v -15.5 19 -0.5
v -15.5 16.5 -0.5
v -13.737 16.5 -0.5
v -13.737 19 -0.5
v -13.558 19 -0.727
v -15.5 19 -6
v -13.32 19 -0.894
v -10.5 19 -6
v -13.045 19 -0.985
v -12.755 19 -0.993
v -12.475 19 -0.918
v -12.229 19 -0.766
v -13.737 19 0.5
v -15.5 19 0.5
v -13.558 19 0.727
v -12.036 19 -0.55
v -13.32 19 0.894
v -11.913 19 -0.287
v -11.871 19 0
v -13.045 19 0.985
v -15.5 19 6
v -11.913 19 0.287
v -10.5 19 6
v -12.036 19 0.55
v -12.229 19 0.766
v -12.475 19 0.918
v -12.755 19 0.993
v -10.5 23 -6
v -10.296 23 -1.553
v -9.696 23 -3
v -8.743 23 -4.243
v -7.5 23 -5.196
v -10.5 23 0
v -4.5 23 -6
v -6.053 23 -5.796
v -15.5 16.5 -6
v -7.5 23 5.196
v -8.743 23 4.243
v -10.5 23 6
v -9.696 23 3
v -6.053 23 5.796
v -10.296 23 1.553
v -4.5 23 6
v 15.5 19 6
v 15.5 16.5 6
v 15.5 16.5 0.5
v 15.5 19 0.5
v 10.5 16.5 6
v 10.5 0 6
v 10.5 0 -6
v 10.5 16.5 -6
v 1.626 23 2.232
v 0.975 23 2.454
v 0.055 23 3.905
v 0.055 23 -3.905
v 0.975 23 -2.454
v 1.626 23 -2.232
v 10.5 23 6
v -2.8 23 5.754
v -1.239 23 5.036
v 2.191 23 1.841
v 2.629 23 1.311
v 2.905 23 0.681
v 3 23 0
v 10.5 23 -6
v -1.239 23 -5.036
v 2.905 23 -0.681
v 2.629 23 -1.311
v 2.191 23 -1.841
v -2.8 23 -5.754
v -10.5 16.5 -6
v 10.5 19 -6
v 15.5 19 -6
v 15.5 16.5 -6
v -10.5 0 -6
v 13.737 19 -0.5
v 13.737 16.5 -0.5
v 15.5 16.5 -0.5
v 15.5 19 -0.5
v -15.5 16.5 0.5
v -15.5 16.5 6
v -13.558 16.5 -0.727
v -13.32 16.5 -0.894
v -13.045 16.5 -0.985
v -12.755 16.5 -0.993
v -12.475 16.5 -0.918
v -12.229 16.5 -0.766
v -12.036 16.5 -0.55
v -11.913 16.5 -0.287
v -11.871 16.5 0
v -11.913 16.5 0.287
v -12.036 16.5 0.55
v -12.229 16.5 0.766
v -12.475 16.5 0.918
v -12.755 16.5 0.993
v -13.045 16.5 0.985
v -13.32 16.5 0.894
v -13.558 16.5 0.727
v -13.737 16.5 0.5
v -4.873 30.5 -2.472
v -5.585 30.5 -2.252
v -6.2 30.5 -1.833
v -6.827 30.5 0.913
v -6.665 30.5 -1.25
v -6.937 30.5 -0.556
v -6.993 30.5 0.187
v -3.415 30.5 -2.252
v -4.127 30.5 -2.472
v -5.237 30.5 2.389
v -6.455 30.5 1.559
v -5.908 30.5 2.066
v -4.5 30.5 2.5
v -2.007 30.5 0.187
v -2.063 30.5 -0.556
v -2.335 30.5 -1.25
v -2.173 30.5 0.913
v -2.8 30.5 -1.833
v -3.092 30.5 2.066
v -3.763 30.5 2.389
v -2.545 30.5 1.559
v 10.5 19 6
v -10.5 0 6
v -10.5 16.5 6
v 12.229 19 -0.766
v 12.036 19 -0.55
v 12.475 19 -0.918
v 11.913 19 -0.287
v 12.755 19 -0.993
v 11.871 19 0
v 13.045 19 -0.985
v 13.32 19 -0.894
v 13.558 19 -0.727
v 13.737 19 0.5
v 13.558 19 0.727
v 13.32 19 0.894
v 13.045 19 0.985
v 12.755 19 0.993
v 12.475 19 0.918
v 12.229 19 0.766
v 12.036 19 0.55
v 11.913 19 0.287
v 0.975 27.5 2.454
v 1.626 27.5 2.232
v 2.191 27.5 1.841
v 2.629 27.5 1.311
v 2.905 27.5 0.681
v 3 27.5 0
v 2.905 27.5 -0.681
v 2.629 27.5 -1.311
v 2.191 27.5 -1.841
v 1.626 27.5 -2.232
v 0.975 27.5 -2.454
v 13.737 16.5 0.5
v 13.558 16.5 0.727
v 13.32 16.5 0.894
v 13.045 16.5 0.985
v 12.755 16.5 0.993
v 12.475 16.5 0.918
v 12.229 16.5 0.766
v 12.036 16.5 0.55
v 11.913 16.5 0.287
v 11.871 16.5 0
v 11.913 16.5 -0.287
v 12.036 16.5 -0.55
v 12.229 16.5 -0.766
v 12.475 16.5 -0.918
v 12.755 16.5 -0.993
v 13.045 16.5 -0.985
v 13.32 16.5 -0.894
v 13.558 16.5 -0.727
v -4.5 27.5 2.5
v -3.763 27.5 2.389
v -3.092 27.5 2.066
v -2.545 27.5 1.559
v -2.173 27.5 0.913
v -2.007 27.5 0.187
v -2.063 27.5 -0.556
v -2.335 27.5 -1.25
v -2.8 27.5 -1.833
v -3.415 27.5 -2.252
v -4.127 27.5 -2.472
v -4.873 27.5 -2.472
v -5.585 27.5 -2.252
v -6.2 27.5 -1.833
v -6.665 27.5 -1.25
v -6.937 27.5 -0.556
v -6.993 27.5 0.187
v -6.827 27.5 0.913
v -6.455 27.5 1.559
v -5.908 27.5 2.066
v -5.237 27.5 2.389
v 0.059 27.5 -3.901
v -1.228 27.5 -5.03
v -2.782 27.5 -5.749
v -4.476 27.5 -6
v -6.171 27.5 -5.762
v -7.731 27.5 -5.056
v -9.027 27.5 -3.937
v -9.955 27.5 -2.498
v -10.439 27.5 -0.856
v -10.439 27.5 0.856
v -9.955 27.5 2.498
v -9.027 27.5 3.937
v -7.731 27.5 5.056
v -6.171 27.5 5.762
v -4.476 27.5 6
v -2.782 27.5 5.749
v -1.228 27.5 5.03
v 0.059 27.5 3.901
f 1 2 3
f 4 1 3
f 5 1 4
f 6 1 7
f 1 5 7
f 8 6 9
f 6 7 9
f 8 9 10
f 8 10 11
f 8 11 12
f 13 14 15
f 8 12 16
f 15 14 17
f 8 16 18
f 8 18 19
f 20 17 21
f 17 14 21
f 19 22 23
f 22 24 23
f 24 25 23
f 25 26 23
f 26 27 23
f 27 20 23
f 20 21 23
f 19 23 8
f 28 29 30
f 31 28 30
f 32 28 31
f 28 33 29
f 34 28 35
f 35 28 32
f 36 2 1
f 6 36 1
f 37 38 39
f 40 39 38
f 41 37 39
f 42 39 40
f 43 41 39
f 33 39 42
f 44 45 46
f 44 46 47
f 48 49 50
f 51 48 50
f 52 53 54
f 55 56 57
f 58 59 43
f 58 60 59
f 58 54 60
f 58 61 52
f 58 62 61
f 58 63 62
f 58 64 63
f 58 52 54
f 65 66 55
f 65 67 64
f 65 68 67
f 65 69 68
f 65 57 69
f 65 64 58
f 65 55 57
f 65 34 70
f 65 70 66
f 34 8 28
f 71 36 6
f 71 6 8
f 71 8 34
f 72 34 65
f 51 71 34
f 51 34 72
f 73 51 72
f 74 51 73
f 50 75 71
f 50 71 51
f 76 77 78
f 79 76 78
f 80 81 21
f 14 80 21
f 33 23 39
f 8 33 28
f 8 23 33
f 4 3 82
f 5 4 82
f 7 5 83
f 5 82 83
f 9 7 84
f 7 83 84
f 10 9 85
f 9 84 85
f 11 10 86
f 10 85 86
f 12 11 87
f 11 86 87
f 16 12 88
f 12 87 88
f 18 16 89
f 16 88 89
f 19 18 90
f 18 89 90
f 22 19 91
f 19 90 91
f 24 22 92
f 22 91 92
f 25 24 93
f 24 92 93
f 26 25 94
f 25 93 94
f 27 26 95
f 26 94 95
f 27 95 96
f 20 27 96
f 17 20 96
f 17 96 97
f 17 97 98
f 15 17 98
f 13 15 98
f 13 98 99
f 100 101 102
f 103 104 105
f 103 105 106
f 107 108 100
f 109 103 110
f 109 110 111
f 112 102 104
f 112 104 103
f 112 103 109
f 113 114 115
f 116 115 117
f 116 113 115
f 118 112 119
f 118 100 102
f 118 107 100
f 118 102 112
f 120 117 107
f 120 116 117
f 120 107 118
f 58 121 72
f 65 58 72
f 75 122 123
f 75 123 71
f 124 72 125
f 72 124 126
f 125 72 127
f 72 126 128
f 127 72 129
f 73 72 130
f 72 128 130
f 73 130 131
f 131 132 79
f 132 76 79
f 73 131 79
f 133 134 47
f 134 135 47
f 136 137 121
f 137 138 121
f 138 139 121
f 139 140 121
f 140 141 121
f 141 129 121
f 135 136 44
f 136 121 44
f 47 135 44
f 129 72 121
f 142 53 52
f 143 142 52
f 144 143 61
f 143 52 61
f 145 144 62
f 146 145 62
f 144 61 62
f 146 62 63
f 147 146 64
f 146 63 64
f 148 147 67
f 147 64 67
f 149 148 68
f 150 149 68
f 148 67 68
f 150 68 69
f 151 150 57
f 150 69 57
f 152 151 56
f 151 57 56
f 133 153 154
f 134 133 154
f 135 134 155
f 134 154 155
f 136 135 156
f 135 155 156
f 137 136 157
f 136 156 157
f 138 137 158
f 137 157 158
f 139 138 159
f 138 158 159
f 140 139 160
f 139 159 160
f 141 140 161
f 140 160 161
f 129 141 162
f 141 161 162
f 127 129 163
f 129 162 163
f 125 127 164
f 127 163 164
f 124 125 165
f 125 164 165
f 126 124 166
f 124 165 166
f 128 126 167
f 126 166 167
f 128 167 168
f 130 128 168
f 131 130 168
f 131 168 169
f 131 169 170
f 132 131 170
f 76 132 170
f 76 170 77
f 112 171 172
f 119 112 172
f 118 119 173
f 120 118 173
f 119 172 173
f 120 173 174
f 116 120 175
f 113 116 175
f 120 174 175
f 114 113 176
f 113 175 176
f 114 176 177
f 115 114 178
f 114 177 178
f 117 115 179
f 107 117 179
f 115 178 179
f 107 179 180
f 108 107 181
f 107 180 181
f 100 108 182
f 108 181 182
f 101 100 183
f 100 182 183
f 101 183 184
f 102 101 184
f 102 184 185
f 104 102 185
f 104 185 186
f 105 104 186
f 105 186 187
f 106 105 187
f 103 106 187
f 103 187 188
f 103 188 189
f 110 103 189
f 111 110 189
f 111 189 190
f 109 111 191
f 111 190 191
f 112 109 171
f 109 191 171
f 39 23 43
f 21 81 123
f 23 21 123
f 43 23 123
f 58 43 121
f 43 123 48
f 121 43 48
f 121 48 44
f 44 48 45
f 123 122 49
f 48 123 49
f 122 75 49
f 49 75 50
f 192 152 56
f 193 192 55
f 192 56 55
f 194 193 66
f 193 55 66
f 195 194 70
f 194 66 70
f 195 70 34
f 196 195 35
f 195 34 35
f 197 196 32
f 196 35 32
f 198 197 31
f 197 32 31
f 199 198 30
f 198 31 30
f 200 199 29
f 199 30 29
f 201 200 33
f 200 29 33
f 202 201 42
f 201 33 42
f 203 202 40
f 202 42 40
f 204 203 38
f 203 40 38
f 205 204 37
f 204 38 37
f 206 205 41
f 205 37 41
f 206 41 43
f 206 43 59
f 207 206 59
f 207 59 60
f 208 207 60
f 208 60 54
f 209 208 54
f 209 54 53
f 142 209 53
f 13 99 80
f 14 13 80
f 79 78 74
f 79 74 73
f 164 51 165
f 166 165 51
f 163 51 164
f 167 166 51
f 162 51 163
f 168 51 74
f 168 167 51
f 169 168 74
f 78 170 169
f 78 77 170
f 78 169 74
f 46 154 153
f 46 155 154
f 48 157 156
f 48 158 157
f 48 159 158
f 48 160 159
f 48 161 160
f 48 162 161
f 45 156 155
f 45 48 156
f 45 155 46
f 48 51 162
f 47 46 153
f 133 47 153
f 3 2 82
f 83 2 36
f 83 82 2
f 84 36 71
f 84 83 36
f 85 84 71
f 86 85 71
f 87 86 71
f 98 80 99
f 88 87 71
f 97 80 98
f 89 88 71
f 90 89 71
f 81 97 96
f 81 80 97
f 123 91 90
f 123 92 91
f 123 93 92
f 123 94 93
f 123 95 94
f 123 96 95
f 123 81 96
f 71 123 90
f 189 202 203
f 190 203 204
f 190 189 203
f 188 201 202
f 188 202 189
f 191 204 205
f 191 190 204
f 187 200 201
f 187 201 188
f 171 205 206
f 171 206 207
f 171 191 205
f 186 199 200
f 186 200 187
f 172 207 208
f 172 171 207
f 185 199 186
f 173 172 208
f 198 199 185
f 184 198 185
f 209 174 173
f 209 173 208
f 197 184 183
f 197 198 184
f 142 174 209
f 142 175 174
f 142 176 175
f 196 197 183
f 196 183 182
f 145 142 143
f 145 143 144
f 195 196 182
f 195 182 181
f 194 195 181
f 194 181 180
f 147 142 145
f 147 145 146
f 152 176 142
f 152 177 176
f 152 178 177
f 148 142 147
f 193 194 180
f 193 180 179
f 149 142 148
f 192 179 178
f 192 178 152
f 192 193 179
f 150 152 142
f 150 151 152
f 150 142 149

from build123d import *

# Parameters (mm, degrees)
SKETCH1_W               = 21
SKETCH1_H               = 12
BOSS_EXTRUDE1_DEPTH     = 23
SKETCH2_W               = 5
SKETCH2_H               = 2.5
BOSS_EXTRUDE2_DEPTH     = 12
CUT_EXTRUDE2_DEPTH      = 29.376927247
CUT_EXTRUDE2_DEPTH_BACK = 12
BOSS_EXTRUDE3_DEPTH     = 4.5
SKETCH5_R               = 2.5
BOSS_EXTRUDE4_DEPTH     = 3


with BuildPart() as part:
    # Sketch1 → Boss-Extrude1 (new body)
    with BuildSketch(Plane(origin=(0, 0, 0), x_dir=(1, 0, 0), z_dir=(0, 1, 0))):
        Rectangle(SKETCH1_W, SKETCH1_H)
    extrude(amount=BOSS_EXTRUDE1_DEPTH)

    # Sketch2 → Boss-Extrude2 (add)
    with BuildSketch(Plane.XY.offset(6)):
        with Locations((13, 17.75)):
            Rectangle(SKETCH2_W, SKETCH2_H)
        with Locations((-13, 17.75)):
            Rectangle(SKETCH2_W, SKETCH2_H)
    extrude(amount=-BOSS_EXTRUDE2_DEPTH)

    # Sketch3 → Cut-Extrude2 (cut, two sides: drawn at the far end of the back side and taken through both)
    with BuildSketch(Plane(origin=(0, 23, 0), x_dir=(1, 0, 0), z_dir=(0, 1, 0)).offset(-CUT_EXTRUDE2_DEPTH_BACK)):
        with BuildLine():
            Line((15.5, 0.5), (15.5, -0.5))
            Line((15.5, -0.5), (13.737359872, -0.5))
            ThreePointArc((13.737359872, -0.5), (11.871334468, 0), (13.737359872, 0.5))
            Line((13.737359872, 0.5), (15.5, 0.5))
        make_face()
        with BuildLine():
            Line((-15.5, 0.5), (-13.737359872, 0.5))
            ThreePointArc((-13.737359872, 0.5), (-11.871334468, 0), (-13.737359872, -0.5))
            Line((-13.737359872, -0.5), (-15.5, -0.5))
            Line((-15.5, -0.5), (-15.5, 0.5))
        make_face()
    extrude(amount=CUT_EXTRUDE2_DEPTH + CUT_EXTRUDE2_DEPTH_BACK, mode=Mode.SUBTRACT)

    # Sketch4 → Boss-Extrude3 (add)
    with BuildSketch(Plane(origin=(0, 23, 0), x_dir=(1, 0, 0), z_dir=(0, 1, 0))):
        with BuildLine():
            ThreePointArc((0.975, 2.454460226), (-10.5, 0), (0.975, -2.454460226))
            ThreePointArc((0.975, -2.454460226), (3, 0), (0.975, 2.454460226))
        make_face()
    extrude(amount=BOSS_EXTRUDE3_DEPTH)

    # Sketch5 → Boss-Extrude4 (add)
    with BuildSketch(Plane(origin=(0, 27.5, 0), x_dir=(1, 0, 0), z_dir=(0, 1, 0))):
        with Locations(Location((-4.5, 0, 0), (0, 0, 270))):
            Circle(SKETCH5_R)
    extrude(amount=BOSS_EXTRUDE4_DEPTH)


solid = part.part
